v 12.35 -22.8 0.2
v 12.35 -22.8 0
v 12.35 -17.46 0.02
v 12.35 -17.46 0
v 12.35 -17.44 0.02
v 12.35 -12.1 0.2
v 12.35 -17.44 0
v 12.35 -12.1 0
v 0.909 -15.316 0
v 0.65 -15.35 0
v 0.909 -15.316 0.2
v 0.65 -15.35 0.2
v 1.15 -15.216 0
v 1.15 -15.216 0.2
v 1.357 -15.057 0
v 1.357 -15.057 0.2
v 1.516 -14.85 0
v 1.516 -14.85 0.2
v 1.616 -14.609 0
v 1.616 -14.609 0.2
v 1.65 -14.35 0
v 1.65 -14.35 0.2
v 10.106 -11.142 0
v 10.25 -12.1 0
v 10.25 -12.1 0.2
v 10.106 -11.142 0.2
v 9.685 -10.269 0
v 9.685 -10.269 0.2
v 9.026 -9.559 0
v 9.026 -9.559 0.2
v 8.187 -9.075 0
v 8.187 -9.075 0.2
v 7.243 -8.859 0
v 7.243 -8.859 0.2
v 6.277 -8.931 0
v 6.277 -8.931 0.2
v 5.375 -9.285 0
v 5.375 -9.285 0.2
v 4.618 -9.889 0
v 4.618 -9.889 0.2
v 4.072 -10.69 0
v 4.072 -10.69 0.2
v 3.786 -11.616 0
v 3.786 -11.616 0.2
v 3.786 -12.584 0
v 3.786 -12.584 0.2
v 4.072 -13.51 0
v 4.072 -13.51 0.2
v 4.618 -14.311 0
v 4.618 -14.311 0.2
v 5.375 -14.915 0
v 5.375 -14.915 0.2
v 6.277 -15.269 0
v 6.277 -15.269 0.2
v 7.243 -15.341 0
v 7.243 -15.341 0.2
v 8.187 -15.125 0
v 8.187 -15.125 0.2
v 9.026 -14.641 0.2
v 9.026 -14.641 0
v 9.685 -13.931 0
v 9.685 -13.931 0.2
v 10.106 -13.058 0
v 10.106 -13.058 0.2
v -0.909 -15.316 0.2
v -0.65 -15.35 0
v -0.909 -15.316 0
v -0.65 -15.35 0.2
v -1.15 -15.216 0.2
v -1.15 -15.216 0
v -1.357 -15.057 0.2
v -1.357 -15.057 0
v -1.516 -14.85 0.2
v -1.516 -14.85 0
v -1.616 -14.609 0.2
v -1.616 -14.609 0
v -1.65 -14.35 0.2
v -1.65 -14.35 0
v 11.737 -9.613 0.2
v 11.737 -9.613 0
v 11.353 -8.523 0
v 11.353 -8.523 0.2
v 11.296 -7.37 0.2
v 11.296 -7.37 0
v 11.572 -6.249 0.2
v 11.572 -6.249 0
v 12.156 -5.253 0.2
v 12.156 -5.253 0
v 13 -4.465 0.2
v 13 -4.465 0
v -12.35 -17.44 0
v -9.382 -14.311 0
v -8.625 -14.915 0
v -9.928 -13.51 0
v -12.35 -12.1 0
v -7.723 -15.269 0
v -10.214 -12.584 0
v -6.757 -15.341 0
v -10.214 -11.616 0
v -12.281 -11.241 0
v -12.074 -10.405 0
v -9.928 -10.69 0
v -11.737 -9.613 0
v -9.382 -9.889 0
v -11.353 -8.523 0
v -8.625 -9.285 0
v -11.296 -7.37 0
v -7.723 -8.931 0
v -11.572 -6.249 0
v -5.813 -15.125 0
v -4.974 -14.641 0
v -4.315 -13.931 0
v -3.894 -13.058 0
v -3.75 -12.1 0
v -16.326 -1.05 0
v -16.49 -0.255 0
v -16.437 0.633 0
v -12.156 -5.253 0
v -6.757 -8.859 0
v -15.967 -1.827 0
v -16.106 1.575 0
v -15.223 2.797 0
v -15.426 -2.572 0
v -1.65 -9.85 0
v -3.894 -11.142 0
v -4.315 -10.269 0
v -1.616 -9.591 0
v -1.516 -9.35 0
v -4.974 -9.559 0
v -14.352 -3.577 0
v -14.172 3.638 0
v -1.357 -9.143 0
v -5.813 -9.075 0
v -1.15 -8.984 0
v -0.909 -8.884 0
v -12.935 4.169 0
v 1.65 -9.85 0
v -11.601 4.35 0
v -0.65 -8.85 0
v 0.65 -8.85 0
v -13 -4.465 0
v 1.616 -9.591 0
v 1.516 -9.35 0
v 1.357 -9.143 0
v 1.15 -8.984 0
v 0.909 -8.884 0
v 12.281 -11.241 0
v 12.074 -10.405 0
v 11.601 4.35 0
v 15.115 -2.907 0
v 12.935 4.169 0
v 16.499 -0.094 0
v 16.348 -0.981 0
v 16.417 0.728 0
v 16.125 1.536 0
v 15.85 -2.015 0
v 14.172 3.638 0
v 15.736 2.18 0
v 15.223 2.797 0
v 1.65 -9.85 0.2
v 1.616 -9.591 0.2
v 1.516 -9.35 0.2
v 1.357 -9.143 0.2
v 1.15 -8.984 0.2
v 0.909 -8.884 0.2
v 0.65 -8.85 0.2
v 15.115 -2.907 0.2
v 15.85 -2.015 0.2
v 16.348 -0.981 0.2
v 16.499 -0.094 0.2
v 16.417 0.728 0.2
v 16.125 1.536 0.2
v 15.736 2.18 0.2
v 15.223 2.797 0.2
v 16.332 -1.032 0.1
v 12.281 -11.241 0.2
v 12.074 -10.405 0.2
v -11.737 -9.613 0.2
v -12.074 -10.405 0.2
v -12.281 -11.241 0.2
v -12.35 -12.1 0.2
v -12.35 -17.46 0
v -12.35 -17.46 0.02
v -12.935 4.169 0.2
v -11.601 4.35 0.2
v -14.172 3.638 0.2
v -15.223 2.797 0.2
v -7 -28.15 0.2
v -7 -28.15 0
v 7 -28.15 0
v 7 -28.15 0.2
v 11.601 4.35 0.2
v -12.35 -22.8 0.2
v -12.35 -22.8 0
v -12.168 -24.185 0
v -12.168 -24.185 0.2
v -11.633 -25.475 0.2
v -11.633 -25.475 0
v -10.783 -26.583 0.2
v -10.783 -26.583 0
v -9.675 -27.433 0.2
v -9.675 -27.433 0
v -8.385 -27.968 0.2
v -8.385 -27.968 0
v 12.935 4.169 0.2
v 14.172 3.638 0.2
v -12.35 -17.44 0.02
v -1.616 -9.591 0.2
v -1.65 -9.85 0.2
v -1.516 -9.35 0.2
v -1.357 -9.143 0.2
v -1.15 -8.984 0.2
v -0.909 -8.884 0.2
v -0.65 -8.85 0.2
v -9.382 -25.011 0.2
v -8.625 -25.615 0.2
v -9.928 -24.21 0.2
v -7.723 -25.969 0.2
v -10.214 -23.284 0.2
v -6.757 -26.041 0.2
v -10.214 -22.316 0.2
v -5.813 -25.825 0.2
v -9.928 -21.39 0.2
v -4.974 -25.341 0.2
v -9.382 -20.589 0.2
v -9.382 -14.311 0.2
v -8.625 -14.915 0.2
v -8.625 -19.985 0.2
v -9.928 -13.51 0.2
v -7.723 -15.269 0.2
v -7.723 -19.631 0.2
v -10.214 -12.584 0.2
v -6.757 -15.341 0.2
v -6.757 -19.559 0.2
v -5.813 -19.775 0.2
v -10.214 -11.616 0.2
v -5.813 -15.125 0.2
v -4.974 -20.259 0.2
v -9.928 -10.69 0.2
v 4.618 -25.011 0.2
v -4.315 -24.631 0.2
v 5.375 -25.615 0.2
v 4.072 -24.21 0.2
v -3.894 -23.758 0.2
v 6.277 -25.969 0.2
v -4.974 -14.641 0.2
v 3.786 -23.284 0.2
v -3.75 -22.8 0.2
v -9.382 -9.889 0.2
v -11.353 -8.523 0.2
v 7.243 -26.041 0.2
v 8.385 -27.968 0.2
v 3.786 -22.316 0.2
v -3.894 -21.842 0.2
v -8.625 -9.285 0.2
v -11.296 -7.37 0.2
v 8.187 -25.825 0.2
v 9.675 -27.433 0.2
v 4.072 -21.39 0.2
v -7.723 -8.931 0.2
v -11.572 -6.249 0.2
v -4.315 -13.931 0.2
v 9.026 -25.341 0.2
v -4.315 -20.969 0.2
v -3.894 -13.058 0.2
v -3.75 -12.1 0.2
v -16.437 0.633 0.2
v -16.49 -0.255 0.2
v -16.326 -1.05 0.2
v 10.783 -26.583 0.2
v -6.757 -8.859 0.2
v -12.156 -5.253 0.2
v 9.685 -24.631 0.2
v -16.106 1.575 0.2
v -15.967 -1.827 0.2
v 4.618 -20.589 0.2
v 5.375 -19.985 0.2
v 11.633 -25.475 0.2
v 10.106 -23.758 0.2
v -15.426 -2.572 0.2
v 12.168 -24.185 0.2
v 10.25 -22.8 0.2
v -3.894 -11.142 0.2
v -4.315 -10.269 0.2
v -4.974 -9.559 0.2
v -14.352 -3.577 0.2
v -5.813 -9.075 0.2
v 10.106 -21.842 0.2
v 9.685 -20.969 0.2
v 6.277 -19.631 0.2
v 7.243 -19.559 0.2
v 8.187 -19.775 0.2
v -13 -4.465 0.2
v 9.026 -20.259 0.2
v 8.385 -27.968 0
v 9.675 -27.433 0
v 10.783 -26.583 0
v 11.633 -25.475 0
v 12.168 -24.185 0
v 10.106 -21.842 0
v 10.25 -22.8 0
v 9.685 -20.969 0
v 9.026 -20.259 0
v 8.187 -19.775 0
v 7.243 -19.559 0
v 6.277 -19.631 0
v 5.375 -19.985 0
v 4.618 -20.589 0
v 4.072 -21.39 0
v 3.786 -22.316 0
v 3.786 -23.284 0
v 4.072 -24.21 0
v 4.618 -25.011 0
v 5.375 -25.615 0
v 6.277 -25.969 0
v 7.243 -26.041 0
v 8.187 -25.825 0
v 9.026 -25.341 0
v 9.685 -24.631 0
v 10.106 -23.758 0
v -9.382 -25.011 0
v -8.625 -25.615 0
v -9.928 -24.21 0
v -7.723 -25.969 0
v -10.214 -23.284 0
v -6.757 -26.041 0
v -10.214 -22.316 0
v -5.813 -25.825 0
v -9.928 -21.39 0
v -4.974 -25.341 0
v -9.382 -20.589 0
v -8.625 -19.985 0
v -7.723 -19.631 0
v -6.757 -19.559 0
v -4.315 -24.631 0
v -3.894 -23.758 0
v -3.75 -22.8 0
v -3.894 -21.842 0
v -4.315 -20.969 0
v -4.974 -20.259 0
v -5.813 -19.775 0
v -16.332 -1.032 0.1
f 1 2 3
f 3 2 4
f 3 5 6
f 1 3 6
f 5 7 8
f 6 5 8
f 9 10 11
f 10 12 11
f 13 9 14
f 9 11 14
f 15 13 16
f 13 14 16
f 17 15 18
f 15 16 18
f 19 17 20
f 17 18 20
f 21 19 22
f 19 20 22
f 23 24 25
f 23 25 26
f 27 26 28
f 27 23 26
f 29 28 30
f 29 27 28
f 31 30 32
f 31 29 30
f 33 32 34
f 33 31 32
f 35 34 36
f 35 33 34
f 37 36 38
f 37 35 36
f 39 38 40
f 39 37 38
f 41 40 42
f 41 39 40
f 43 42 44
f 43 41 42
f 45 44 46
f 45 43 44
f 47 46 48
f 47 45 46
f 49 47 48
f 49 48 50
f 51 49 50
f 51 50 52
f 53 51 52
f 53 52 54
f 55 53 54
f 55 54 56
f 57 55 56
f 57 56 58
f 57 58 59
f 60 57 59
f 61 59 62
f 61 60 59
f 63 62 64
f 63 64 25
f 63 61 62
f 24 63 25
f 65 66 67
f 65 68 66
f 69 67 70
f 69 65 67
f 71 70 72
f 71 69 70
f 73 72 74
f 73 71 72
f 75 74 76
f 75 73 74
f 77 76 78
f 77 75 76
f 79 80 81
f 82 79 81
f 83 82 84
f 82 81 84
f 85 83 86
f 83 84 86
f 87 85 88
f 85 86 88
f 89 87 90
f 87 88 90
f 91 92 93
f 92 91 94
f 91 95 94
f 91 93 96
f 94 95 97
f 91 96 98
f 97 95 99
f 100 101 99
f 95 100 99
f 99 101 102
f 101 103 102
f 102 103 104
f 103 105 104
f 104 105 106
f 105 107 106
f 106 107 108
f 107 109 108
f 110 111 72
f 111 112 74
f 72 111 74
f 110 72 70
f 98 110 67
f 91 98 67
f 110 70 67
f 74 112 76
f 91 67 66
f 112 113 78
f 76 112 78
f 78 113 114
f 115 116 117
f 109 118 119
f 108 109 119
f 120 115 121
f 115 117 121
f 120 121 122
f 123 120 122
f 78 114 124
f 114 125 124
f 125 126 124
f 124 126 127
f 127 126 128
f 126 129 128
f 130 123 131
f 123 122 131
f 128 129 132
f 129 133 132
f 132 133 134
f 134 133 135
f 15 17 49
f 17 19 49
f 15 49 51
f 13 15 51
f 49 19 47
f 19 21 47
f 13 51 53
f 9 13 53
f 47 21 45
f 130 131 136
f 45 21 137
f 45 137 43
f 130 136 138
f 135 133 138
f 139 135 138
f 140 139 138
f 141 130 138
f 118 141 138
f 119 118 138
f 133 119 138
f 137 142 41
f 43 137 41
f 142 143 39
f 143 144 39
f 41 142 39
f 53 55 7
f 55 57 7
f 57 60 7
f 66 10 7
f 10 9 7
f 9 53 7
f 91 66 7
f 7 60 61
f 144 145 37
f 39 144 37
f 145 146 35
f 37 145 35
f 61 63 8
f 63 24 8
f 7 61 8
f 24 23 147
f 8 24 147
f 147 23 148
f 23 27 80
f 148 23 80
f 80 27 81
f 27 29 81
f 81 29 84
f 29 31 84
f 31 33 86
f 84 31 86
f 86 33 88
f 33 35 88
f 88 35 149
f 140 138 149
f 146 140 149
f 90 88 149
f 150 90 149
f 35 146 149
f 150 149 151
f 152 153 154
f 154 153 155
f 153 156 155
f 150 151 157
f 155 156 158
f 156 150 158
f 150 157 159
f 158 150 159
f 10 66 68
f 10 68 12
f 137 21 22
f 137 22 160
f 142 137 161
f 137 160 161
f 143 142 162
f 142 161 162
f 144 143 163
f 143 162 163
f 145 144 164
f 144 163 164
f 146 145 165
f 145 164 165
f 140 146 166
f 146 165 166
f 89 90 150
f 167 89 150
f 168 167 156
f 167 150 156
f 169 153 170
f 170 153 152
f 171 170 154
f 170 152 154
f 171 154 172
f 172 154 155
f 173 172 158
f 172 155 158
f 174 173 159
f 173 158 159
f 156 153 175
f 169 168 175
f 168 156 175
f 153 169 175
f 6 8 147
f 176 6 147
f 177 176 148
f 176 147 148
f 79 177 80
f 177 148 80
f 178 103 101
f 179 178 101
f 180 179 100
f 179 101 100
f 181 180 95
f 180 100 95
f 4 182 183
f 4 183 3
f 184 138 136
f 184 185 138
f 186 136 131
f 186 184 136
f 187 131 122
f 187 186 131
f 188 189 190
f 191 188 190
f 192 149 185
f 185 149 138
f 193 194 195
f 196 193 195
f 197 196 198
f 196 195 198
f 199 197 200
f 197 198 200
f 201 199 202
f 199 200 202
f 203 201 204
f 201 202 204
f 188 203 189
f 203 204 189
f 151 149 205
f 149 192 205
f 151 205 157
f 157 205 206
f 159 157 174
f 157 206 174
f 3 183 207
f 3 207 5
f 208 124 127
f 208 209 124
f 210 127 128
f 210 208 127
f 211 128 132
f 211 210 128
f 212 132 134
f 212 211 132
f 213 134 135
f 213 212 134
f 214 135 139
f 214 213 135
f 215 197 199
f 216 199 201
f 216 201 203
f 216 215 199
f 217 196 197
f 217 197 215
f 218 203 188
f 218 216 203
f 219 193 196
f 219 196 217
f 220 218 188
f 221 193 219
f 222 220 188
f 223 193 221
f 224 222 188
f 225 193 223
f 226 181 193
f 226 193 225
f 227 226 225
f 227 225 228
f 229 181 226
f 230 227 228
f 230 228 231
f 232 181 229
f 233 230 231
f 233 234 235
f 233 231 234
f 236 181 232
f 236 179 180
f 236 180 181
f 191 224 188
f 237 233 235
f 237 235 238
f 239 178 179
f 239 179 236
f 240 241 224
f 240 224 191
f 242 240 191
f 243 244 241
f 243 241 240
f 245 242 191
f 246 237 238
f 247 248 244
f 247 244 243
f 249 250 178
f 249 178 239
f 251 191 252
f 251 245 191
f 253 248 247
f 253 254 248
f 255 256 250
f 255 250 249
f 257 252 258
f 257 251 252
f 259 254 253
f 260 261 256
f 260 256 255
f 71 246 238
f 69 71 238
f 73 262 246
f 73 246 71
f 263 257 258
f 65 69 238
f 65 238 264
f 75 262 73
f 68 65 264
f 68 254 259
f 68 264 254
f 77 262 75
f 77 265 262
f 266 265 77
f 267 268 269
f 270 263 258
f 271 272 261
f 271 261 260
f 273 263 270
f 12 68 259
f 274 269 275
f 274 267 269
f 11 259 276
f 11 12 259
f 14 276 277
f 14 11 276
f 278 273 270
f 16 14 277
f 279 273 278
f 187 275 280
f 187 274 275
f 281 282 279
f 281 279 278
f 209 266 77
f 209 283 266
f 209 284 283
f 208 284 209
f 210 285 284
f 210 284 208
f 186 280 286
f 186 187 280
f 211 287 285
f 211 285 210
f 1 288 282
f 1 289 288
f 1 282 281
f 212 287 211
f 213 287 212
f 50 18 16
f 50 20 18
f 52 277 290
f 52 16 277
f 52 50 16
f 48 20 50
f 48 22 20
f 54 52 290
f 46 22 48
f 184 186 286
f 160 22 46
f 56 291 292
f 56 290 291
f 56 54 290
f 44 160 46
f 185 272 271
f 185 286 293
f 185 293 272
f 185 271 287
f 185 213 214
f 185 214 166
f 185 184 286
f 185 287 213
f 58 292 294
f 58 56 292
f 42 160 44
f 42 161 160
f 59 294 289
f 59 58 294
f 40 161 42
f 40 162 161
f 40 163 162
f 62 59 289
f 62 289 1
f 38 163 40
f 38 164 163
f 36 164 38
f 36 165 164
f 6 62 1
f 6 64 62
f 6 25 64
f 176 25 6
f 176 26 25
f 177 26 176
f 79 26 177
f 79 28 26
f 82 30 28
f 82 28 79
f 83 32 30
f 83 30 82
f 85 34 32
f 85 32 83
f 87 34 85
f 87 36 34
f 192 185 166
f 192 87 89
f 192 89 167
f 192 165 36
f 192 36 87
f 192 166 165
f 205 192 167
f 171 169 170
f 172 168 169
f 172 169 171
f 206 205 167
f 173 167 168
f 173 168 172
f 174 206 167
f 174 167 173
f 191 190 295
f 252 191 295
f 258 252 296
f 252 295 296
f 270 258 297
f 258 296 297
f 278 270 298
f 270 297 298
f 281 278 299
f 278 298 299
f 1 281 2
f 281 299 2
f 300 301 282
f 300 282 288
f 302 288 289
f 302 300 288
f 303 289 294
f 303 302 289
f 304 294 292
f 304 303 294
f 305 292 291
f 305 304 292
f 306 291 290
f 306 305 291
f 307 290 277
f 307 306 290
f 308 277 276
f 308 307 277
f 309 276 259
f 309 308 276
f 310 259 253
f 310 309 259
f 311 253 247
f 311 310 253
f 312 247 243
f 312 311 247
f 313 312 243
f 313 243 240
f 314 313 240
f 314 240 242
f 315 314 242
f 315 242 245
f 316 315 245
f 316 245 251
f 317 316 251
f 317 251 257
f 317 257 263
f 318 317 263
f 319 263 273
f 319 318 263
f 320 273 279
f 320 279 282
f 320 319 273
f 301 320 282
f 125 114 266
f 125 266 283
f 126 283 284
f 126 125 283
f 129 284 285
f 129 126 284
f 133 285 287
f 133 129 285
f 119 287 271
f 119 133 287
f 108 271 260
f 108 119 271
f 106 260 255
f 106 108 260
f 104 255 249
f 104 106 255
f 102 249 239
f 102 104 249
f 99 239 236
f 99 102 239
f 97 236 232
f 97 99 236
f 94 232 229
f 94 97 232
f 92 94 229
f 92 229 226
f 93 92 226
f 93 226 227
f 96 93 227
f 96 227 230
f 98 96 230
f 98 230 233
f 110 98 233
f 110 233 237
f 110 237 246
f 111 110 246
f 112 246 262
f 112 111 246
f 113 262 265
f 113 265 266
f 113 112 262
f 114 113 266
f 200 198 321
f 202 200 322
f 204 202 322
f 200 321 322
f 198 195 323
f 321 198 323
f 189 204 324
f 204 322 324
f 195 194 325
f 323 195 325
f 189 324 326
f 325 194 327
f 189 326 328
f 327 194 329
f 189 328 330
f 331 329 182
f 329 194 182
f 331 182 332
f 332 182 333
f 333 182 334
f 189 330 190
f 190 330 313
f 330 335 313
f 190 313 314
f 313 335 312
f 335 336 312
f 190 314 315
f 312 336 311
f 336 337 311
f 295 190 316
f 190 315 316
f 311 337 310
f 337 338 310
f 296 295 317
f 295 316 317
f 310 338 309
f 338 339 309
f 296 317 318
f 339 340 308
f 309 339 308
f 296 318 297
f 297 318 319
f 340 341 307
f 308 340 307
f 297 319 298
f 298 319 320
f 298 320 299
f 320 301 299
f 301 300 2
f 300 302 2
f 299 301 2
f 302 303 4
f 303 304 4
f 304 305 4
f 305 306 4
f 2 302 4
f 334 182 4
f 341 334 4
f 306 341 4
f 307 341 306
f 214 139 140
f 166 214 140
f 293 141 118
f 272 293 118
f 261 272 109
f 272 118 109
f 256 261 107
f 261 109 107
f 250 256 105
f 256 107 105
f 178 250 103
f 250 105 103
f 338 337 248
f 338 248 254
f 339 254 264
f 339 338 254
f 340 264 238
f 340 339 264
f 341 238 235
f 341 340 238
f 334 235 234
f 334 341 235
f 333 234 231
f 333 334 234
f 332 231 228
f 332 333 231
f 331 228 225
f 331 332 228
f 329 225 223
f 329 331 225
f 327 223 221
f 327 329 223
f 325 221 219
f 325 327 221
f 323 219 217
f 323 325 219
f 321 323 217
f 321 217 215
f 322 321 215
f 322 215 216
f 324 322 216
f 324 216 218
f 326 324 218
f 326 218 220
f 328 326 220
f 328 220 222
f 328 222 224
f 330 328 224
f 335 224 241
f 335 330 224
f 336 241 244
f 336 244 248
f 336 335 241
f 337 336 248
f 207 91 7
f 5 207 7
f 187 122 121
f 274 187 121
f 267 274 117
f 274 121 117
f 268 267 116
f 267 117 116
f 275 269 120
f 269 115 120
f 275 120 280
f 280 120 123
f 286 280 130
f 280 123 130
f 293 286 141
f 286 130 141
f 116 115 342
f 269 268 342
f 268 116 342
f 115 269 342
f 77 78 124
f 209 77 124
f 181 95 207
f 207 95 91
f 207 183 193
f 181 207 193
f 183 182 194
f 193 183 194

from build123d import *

# Parameters (mm, degrees)
F0_R     = 3.25
F0_W     = 3.3
F0_H     = 6.5
F1_DEPTH = 0.2
F2_R     = 5
F3_W     = 24.7
F3_H     = 0.02
F4_DEPTH = 0.02
F5_R     = 1


with BuildPart() as f1:
    # F0 (on Top) → F1 (new body)
    with BuildSketch(Plane.XY):
        with BuildLine():
            Line((13.2, 4.35), (-13.2, 4.35))
            add(Edge.make_bspline(
                [(-13.2, 4.35), (-20.78037737, -0.0910291662), (-13, -4.4647700118)],
                knots=[2.4980915448, 2.4980915448, 2.4980915448, 3.8050320878, 3.8050320878, 3.8050320878], degree=2, weights=[1, 0.7939788481, 1]))
            ThreePointArc((-13, -4.4647700118), (-11.3932239297, -6.7993510754), (-11.7365717654, -9.6125539381))
            ThreePointArc((-11.7365717654, -9.6125539381), (-12.1943796042, -10.8190157973), (-12.35, -12.1))
            Line((-12.35, -12.1), (-12.35, -22.8))
            ThreePointArc((-12.35, -22.8), (-10.7830212793, -26.5830212793), (-7, -28.15))
            Line((-7, -28.15), (7, -28.15))
            ThreePointArc((7, -28.15), (10.7830212793, -26.5830212793), (12.35, -22.8))
            Line((12.35, -22.8), (12.35, -12.1))
            ThreePointArc((12.35, -12.1), (12.1943796042, -10.8190157973), (11.7365717654, -9.6125539381))
            ThreePointArc((11.7365717654, -9.6125539381), (11.3932239297, -6.7993510754), (13, -4.4647700118))
            add(Edge.make_bspline(
                [(13, -4.4647700118), (20.78037737, -0.0910291662), (13.2, 4.35)],
                knots=[5.6197458729, 5.6197458729, 5.6197458729, 6.926686416, 6.926686416, 6.926686416], degree=2, weights=[1, 0.7939788481, 1]))
        make_face()
        with Locations((-7, -22.8)):
            Circle(F0_R, mode=Mode.SUBTRACT)
        with Locations((-7, -12.1)):
            Circle(F0_R, mode=Mode.SUBTRACT)
        with Locations((7, -22.8)):
            Circle(F0_R, mode=Mode.SUBTRACT)
        with Locations((0, -12.1)):
            Rectangle(F0_W, F0_H, mode=Mode.SUBTRACT)
        with Locations((7, -12.1)):
            Circle(F0_R, mode=Mode.SUBTRACT)
    extrude(amount=F1_DEPTH)

    # F2
    f2_edges = [f1.edges().sort_by_distance(p)[0] for p in [
        (13.2, 4.35, 0.1),
        (-13.2, 4.35, 0.1),
    ]]
    fillet(f2_edges, radius=F2_R)

    # F3 (on face) → F4 (cut)
    with BuildSketch(Plane(origin=(0, 0, 0), x_dir=(1, 0, 0), z_dir=(0, 0, -1))):
        with Locations((0, 17.45)):
            Rectangle(F3_W, F3_H)
    extrude(amount=-F4_DEPTH, mode=Mode.SUBTRACT)

    # F5
    f5_edges = [f1.edges().sort_by_distance(p)[0] for p in [
        (-1.65, -8.85, 0.1),
        (1.65, -8.85, 0.1),
        (-1.65, -15.35, 0.1),
        (1.65, -15.35, 0.1),
    ]]
    fillet(f5_edges, radius=F5_R)


solid = f1.part
